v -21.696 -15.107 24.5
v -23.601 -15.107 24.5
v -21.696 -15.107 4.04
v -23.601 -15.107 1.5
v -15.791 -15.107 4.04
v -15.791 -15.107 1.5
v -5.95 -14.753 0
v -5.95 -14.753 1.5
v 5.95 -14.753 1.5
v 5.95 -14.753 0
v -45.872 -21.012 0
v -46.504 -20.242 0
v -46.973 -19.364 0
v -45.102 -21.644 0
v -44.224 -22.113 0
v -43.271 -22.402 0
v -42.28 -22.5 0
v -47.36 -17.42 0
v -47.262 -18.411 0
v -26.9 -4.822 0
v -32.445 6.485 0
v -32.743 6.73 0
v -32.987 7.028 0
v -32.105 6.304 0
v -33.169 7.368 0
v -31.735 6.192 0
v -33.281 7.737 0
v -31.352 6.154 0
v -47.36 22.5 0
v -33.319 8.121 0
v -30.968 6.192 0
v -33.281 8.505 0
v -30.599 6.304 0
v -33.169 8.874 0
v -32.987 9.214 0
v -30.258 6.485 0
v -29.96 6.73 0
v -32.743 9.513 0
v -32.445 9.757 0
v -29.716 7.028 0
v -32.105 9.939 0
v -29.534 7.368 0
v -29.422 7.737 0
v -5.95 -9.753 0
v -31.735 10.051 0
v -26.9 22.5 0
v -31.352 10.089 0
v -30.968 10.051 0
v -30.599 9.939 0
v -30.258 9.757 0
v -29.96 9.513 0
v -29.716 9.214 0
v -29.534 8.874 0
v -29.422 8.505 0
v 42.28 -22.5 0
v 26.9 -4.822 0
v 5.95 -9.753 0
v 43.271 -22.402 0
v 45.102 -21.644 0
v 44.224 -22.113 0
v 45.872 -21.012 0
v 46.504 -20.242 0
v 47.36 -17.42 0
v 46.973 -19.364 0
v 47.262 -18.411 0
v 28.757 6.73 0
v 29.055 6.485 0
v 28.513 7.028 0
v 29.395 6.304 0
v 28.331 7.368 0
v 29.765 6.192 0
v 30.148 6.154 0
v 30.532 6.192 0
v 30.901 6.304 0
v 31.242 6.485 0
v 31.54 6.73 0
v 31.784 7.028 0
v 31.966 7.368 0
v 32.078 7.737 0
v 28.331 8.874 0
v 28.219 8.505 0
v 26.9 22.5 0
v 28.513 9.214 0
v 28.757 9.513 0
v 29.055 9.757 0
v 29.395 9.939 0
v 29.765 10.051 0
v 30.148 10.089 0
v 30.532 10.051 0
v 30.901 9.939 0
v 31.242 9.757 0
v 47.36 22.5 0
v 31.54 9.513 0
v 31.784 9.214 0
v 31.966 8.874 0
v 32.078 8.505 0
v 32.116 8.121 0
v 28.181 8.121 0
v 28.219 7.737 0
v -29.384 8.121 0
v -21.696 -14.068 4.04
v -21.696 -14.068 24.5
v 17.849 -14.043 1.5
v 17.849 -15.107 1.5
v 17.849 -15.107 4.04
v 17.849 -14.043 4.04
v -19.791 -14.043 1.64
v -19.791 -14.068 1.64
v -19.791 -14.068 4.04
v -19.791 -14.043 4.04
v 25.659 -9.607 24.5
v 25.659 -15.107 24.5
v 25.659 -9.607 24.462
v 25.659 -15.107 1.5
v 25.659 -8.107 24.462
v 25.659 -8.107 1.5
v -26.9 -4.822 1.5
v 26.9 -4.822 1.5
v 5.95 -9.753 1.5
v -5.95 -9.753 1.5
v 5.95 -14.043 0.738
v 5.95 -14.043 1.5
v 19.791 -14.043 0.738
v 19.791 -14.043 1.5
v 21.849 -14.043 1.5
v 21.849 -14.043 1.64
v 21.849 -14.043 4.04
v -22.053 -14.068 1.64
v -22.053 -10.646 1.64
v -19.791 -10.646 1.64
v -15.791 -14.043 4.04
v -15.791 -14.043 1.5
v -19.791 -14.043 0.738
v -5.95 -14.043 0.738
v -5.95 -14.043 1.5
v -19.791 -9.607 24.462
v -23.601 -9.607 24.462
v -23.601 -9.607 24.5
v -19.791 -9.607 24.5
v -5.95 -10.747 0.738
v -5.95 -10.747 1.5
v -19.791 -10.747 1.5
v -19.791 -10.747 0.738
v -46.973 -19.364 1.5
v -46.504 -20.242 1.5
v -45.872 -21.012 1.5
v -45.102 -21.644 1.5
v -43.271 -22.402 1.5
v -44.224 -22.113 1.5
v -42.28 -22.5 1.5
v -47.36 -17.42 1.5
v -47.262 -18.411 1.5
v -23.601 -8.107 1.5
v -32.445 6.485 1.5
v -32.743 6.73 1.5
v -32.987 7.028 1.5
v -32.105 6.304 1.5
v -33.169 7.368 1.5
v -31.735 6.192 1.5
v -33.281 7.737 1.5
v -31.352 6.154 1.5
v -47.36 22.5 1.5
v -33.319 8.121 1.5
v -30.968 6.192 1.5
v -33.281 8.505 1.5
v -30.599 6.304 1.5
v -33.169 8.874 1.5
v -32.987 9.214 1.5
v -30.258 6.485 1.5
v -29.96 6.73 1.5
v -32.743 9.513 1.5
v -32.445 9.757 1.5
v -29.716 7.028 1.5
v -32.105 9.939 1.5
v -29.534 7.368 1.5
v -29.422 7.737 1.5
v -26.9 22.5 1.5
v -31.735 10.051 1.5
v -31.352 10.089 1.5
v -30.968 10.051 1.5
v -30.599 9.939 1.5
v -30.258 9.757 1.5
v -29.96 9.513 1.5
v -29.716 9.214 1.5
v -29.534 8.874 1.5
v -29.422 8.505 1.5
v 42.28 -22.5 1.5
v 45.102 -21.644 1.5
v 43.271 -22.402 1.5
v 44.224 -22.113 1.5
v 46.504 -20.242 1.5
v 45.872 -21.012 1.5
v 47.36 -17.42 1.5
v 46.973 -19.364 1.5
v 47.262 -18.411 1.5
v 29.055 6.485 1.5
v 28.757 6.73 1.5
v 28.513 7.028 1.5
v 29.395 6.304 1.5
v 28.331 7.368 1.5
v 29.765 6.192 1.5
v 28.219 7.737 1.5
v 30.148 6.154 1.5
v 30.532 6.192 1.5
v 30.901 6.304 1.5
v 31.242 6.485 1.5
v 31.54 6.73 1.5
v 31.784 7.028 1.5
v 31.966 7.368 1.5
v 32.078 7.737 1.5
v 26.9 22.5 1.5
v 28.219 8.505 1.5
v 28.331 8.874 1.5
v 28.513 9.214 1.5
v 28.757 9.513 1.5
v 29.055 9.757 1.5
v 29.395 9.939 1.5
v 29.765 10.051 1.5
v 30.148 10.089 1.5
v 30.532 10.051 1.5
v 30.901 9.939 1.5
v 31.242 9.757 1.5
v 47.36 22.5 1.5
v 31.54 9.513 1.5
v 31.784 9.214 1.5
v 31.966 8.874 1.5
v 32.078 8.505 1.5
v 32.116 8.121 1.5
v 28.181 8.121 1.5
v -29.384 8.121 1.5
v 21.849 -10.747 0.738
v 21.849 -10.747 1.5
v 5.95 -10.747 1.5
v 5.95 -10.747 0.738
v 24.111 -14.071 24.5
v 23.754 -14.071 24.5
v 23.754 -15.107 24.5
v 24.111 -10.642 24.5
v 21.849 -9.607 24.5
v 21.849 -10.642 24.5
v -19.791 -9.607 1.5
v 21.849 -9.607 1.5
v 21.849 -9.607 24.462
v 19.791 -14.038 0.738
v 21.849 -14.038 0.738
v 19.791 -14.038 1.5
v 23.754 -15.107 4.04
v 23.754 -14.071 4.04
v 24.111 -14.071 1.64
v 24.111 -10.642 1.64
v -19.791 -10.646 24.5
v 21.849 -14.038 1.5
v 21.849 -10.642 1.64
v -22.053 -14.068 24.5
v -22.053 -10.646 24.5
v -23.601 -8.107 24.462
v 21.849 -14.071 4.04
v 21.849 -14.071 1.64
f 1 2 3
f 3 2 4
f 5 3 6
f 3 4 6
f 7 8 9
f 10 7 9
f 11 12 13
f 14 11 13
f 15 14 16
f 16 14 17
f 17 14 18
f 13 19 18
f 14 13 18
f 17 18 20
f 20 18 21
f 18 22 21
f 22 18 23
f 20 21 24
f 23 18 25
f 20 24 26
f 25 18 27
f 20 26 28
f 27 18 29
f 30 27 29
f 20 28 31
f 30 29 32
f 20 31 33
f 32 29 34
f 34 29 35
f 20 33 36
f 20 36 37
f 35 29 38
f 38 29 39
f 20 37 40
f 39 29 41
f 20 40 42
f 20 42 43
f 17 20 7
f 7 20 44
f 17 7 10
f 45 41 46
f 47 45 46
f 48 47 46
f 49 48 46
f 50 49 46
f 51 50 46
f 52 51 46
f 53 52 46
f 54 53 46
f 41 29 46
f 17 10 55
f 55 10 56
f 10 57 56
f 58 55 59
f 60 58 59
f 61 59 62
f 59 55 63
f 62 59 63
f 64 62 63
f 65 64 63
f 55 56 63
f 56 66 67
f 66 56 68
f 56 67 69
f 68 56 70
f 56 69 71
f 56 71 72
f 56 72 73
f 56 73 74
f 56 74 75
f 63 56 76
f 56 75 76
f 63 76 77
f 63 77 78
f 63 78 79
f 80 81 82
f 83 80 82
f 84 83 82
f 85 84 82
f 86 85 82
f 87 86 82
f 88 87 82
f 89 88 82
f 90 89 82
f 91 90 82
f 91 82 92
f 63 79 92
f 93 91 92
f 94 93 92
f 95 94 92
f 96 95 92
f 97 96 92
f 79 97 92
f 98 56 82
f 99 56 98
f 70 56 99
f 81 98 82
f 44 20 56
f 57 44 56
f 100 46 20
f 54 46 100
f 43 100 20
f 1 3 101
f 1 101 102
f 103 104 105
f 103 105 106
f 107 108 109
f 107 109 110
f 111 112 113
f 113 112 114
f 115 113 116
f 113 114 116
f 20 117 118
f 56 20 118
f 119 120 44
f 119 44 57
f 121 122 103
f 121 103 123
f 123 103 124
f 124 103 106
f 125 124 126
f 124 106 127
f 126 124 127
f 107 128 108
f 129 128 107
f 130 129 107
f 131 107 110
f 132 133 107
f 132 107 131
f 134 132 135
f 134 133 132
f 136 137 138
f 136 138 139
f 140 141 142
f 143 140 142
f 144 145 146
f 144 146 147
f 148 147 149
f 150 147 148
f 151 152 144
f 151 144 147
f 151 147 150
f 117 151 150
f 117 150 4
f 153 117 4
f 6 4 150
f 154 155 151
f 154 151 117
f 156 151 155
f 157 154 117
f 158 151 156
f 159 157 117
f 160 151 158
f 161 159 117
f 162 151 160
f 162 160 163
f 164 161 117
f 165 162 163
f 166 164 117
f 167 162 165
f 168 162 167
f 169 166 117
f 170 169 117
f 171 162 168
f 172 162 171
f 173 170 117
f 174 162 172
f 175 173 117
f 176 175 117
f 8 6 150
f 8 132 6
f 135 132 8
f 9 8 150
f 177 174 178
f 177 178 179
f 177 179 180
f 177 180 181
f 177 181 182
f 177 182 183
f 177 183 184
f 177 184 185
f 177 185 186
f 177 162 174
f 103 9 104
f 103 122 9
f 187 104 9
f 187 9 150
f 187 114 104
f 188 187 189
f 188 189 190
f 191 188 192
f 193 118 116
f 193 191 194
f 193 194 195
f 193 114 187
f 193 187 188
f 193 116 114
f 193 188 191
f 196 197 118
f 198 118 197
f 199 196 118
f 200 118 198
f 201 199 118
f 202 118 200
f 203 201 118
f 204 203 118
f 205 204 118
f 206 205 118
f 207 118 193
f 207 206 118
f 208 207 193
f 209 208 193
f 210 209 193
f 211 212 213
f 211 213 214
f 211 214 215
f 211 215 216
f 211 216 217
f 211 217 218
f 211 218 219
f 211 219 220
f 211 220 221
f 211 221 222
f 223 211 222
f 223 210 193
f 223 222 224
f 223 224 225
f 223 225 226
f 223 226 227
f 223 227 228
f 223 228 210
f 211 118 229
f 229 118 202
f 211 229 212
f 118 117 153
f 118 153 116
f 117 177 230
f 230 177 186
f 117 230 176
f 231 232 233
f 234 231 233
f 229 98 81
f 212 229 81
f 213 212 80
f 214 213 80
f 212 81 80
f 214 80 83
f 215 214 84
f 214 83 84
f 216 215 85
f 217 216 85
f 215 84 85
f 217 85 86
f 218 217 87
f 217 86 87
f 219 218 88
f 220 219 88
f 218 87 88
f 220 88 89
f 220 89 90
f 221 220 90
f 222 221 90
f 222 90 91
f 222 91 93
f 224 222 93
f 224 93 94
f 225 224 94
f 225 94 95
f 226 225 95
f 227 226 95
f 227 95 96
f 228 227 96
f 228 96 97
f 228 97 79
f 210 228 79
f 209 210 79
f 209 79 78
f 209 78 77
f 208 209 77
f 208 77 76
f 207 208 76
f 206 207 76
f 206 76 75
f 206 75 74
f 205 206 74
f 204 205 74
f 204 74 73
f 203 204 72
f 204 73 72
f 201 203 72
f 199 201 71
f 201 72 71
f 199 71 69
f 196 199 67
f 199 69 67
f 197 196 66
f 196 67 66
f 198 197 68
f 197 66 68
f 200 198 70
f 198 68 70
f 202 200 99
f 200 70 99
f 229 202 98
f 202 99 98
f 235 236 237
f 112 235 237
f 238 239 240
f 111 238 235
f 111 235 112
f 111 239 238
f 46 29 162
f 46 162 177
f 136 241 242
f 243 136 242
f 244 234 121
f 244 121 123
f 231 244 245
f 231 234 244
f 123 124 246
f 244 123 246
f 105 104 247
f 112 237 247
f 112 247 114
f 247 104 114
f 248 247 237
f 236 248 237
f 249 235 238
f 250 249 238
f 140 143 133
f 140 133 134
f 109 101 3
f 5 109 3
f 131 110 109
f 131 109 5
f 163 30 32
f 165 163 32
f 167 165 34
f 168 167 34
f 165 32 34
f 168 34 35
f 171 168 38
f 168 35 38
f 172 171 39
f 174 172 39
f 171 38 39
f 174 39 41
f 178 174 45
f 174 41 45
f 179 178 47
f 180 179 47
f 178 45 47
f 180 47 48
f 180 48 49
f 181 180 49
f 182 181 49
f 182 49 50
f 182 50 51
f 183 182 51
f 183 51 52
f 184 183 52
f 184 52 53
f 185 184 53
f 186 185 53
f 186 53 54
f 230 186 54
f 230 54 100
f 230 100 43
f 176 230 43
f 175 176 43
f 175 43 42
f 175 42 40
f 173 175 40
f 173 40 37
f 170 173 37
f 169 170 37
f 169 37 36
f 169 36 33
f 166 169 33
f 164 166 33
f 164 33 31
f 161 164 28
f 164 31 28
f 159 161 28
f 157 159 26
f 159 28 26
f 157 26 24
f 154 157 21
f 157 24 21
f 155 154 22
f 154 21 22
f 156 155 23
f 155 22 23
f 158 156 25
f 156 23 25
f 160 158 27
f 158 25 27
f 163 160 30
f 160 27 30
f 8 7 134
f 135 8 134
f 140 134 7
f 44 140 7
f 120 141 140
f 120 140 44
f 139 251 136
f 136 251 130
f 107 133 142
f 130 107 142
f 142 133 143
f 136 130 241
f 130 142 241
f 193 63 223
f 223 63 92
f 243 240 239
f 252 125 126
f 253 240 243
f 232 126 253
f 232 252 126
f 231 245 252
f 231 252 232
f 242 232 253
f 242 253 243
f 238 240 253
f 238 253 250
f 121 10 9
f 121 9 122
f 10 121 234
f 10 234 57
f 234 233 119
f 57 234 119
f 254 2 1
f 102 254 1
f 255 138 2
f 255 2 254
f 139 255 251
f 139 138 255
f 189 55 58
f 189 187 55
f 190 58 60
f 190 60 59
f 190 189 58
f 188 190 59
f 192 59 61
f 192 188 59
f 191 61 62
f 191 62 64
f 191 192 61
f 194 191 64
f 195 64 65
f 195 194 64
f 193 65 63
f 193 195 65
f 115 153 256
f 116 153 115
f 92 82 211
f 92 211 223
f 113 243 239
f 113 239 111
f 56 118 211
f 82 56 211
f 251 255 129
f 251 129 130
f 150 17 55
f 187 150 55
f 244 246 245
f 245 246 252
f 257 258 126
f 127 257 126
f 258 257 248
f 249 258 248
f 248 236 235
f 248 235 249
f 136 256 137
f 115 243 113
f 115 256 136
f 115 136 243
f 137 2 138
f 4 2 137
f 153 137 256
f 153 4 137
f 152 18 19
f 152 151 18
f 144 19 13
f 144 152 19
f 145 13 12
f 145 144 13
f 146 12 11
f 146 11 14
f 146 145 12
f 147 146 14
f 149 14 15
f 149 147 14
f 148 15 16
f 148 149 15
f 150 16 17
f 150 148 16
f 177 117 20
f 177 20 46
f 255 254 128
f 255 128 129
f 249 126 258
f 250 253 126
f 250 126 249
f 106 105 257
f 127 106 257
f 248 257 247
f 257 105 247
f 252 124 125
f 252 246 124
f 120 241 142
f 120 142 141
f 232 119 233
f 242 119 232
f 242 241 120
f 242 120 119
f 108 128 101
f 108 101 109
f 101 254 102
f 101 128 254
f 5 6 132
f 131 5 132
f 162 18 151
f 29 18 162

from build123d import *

# Parameters (mm, degrees)
F0_W      = 94.72
F0_H      = 45
F1_DEPTH  = 1.5
F3_D      = 3.935
F3_DEPTH  = 25.4
F3_TIP    = 1.1821932679
F4_D      = 3.935
F4_DEPTH  = 25.4
F4_TIP    = 1.1821932679
F5_W      = 50
F5_H      = 12.7415785939
F6_DEPTH  = 25.4
F7_R      = 5.08
F8_W      = 50
F8_H      = 15.24
F9_DEPTH  = 25.4
F10_W     = 11.9
F10_H     = 5
F11_DEPTH = 25.4
F12_W     = 3.81
F12_H     = 5.5
F13_DEPTH = 23
F14_W     = 4.5235089016
F14_H     = 3.4214928448
F15_DEPTH = 22.86
F16_W     = 4.5235114
F16_H     = 3.429
F17_DEPTH = 22.86
F18_W     = 2.0578785336
F18_H     = 3.2914727926
F19_DEPTH = 0.762
F20_W     = 49.26
F20_H     = 1.5
F21_DEPTH = 22.9616
F22_W     = 4
F22_H     = 1.0637021292
F23_DEPTH = 2.54
F24_W     = 1.9
F24_H     = 27.3218312255
F25_DEPTH = 25.4
F26_W     = 1.905
F26_H     = 20.46
F27_DEPTH = 1.651
F28_W     = 1.905
F28_H     = 20.46
F29_DEPTH = 3.048


with BuildPart() as f1:
    # F0 (on Top) → F1 (new body)
    with BuildSketch(Plane.XY):
        Rectangle(F0_W, F0_H)
    extrude(amount=F1_DEPTH)

    # F3
    with Locations(Plane.XY.offset(1.5)):
        with Locations((-31.3515785038, 8.1213163212)):
            Hole(F3_D / 2, depth=F3_DEPTH)
            with Locations((0, 0, -(F3_DEPTH + F3_TIP / 2))):  # 118° drill point
                Cone(0, F3_D / 2, F3_TIP, mode=Mode.SUBTRACT)

    # F4
    with Locations(Plane.XY.offset(1.5)):
        with Locations((30.1484214962, 8.1213163212)):
            Hole(F4_D / 2, depth=F4_DEPTH)
            with Locations((0, 0, -(F4_DEPTH + F4_TIP / 2))):  # 118° drill point
                Cone(0, F4_D / 2, F4_TIP, mode=Mode.SUBTRACT)

    # F5 (on face) → F6 (cut)
    with BuildSketch(Plane.XY.offset(1.5)):
        with Locations((0, 16.1292107031)):
            Rectangle(F5_W, F5_H)
    extrude(amount=-F6_DEPTH, mode=Mode.SUBTRACT)

    # F7
    f7_edges = [f1.edges().sort_by_distance(p)[0] for p in [
        (-47.36, -22.5, 0.75),
        (47.36, -22.5, 0.75),
    ]]
    fillet(f7_edges, radius=F7_R)

    # F8 (on face) → F9 (cut)
    with BuildSketch(Plane.XY.offset(1.5)):
        with Locations((0, 2.7981687745)):
            Rectangle(F8_W, F8_H)
    extrude(amount=-F9_DEPTH, mode=Mode.SUBTRACT)

    # F10 (on face) → F11 (cut)
    with BuildSketch(Plane.XY.offset(1.5)):
        with Locations((0, -12.2533300715)):
            Rectangle(F10_W, F10_H)
    extrude(amount=-F11_DEPTH, mode=Mode.SUBTRACT)

    # F12 (on face) → F13 (join)
    with BuildSketch(Plane.XY.offset(1.5)):
        with Locations((-21.6960607332, -12.3569313288)):
            Rectangle(F12_W, F12_H)
        with Locations((23.7539392668, -12.3569313288)):
            Rectangle(F12_W, F12_H)
    extrude(amount=F13_DEPTH)

    # F14 (on face) → F15 (cut)
    with BuildSketch(Plane.XY.offset(24.5)):
        with Locations((-19.7910607332, -12.3569313288)):
            Rectangle(F14_W, F14_H)
    extrude(amount=-F15_DEPTH, mode=Mode.SUBTRACT)

    # F16 (on face) → F17 (cut)
    with BuildSketch(Plane.XY.offset(24.5)):
        with Locations((21.8489392668, -12.3569313288)):
            Rectangle(F16_W, F16_H)
    extrude(amount=-F17_DEPTH, mode=Mode.SUBTRACT)

    # F18 (on face) → F19 (cut)
    with BuildSketch(Plane.XY.offset(1.5)):
        Polygon((-19.7910607332, -10.7469186187), (-19.7910607332, -14.0432291996), (19.7910607332, -14.0432291996), (19.7910607332, -14.0383914113), (19.7910607332, -10.7469186187), align=None)
        with Locations((20.82, -12.392655015)):
            Rectangle(F18_W, F18_H)
    extrude(amount=-F19_DEPTH, mode=Mode.SUBTRACT)

    # F20 (on face) → F21 (join)
    with BuildSketch(Plane.XY.offset(1.5)):
        with Locations((1.0289392668, -8.8569313288)):
            Rectangle(F20_W, F20_H)
    extrude(amount=F21_DEPTH)

    # F22 (on face) → F23 (join)
    with BuildSketch(Plane.XY.offset(1.5)):
        with Locations((-17.7910607332, -14.5750802642)):
            Rectangle(F22_W, F22_H)
        with Locations((19.8489392668, -14.5750802642)):
            Rectangle(F22_W, F22_H)
    extrude(amount=F23_DEPTH)

    # F24 (on face) → F25 (cut)
    with BuildSketch(Plane.XY.offset(1.5)):
        with Locations((-25.95, 8.8390843872)):
            Rectangle(F24_W, F24_H)
        with Locations((25.95, 8.8390843872)):
            Rectangle(F24_W, F24_H)
    extrude(amount=-F25_DEPTH, mode=Mode.SUBTRACT)

    # F26 (on face) → F27 (cut)
    with BuildSketch(Plane.XZ.offset(15.1069313288)):
        with Locations((-20.7435607332, 14.27)):
            Rectangle(F26_W, F26_H)
    extrude(amount=-F27_DEPTH, mode=Mode.SUBTRACT)

    # F28 (on face) → F29 (cut)
    with BuildSketch(Plane.XZ.offset(15.1069313288)):
        with Locations((22.8014392668, 14.27)):
            Rectangle(F28_W, F28_H)
    extrude(amount=-F29_DEPTH, mode=Mode.SUBTRACT)


solid = f1.part
